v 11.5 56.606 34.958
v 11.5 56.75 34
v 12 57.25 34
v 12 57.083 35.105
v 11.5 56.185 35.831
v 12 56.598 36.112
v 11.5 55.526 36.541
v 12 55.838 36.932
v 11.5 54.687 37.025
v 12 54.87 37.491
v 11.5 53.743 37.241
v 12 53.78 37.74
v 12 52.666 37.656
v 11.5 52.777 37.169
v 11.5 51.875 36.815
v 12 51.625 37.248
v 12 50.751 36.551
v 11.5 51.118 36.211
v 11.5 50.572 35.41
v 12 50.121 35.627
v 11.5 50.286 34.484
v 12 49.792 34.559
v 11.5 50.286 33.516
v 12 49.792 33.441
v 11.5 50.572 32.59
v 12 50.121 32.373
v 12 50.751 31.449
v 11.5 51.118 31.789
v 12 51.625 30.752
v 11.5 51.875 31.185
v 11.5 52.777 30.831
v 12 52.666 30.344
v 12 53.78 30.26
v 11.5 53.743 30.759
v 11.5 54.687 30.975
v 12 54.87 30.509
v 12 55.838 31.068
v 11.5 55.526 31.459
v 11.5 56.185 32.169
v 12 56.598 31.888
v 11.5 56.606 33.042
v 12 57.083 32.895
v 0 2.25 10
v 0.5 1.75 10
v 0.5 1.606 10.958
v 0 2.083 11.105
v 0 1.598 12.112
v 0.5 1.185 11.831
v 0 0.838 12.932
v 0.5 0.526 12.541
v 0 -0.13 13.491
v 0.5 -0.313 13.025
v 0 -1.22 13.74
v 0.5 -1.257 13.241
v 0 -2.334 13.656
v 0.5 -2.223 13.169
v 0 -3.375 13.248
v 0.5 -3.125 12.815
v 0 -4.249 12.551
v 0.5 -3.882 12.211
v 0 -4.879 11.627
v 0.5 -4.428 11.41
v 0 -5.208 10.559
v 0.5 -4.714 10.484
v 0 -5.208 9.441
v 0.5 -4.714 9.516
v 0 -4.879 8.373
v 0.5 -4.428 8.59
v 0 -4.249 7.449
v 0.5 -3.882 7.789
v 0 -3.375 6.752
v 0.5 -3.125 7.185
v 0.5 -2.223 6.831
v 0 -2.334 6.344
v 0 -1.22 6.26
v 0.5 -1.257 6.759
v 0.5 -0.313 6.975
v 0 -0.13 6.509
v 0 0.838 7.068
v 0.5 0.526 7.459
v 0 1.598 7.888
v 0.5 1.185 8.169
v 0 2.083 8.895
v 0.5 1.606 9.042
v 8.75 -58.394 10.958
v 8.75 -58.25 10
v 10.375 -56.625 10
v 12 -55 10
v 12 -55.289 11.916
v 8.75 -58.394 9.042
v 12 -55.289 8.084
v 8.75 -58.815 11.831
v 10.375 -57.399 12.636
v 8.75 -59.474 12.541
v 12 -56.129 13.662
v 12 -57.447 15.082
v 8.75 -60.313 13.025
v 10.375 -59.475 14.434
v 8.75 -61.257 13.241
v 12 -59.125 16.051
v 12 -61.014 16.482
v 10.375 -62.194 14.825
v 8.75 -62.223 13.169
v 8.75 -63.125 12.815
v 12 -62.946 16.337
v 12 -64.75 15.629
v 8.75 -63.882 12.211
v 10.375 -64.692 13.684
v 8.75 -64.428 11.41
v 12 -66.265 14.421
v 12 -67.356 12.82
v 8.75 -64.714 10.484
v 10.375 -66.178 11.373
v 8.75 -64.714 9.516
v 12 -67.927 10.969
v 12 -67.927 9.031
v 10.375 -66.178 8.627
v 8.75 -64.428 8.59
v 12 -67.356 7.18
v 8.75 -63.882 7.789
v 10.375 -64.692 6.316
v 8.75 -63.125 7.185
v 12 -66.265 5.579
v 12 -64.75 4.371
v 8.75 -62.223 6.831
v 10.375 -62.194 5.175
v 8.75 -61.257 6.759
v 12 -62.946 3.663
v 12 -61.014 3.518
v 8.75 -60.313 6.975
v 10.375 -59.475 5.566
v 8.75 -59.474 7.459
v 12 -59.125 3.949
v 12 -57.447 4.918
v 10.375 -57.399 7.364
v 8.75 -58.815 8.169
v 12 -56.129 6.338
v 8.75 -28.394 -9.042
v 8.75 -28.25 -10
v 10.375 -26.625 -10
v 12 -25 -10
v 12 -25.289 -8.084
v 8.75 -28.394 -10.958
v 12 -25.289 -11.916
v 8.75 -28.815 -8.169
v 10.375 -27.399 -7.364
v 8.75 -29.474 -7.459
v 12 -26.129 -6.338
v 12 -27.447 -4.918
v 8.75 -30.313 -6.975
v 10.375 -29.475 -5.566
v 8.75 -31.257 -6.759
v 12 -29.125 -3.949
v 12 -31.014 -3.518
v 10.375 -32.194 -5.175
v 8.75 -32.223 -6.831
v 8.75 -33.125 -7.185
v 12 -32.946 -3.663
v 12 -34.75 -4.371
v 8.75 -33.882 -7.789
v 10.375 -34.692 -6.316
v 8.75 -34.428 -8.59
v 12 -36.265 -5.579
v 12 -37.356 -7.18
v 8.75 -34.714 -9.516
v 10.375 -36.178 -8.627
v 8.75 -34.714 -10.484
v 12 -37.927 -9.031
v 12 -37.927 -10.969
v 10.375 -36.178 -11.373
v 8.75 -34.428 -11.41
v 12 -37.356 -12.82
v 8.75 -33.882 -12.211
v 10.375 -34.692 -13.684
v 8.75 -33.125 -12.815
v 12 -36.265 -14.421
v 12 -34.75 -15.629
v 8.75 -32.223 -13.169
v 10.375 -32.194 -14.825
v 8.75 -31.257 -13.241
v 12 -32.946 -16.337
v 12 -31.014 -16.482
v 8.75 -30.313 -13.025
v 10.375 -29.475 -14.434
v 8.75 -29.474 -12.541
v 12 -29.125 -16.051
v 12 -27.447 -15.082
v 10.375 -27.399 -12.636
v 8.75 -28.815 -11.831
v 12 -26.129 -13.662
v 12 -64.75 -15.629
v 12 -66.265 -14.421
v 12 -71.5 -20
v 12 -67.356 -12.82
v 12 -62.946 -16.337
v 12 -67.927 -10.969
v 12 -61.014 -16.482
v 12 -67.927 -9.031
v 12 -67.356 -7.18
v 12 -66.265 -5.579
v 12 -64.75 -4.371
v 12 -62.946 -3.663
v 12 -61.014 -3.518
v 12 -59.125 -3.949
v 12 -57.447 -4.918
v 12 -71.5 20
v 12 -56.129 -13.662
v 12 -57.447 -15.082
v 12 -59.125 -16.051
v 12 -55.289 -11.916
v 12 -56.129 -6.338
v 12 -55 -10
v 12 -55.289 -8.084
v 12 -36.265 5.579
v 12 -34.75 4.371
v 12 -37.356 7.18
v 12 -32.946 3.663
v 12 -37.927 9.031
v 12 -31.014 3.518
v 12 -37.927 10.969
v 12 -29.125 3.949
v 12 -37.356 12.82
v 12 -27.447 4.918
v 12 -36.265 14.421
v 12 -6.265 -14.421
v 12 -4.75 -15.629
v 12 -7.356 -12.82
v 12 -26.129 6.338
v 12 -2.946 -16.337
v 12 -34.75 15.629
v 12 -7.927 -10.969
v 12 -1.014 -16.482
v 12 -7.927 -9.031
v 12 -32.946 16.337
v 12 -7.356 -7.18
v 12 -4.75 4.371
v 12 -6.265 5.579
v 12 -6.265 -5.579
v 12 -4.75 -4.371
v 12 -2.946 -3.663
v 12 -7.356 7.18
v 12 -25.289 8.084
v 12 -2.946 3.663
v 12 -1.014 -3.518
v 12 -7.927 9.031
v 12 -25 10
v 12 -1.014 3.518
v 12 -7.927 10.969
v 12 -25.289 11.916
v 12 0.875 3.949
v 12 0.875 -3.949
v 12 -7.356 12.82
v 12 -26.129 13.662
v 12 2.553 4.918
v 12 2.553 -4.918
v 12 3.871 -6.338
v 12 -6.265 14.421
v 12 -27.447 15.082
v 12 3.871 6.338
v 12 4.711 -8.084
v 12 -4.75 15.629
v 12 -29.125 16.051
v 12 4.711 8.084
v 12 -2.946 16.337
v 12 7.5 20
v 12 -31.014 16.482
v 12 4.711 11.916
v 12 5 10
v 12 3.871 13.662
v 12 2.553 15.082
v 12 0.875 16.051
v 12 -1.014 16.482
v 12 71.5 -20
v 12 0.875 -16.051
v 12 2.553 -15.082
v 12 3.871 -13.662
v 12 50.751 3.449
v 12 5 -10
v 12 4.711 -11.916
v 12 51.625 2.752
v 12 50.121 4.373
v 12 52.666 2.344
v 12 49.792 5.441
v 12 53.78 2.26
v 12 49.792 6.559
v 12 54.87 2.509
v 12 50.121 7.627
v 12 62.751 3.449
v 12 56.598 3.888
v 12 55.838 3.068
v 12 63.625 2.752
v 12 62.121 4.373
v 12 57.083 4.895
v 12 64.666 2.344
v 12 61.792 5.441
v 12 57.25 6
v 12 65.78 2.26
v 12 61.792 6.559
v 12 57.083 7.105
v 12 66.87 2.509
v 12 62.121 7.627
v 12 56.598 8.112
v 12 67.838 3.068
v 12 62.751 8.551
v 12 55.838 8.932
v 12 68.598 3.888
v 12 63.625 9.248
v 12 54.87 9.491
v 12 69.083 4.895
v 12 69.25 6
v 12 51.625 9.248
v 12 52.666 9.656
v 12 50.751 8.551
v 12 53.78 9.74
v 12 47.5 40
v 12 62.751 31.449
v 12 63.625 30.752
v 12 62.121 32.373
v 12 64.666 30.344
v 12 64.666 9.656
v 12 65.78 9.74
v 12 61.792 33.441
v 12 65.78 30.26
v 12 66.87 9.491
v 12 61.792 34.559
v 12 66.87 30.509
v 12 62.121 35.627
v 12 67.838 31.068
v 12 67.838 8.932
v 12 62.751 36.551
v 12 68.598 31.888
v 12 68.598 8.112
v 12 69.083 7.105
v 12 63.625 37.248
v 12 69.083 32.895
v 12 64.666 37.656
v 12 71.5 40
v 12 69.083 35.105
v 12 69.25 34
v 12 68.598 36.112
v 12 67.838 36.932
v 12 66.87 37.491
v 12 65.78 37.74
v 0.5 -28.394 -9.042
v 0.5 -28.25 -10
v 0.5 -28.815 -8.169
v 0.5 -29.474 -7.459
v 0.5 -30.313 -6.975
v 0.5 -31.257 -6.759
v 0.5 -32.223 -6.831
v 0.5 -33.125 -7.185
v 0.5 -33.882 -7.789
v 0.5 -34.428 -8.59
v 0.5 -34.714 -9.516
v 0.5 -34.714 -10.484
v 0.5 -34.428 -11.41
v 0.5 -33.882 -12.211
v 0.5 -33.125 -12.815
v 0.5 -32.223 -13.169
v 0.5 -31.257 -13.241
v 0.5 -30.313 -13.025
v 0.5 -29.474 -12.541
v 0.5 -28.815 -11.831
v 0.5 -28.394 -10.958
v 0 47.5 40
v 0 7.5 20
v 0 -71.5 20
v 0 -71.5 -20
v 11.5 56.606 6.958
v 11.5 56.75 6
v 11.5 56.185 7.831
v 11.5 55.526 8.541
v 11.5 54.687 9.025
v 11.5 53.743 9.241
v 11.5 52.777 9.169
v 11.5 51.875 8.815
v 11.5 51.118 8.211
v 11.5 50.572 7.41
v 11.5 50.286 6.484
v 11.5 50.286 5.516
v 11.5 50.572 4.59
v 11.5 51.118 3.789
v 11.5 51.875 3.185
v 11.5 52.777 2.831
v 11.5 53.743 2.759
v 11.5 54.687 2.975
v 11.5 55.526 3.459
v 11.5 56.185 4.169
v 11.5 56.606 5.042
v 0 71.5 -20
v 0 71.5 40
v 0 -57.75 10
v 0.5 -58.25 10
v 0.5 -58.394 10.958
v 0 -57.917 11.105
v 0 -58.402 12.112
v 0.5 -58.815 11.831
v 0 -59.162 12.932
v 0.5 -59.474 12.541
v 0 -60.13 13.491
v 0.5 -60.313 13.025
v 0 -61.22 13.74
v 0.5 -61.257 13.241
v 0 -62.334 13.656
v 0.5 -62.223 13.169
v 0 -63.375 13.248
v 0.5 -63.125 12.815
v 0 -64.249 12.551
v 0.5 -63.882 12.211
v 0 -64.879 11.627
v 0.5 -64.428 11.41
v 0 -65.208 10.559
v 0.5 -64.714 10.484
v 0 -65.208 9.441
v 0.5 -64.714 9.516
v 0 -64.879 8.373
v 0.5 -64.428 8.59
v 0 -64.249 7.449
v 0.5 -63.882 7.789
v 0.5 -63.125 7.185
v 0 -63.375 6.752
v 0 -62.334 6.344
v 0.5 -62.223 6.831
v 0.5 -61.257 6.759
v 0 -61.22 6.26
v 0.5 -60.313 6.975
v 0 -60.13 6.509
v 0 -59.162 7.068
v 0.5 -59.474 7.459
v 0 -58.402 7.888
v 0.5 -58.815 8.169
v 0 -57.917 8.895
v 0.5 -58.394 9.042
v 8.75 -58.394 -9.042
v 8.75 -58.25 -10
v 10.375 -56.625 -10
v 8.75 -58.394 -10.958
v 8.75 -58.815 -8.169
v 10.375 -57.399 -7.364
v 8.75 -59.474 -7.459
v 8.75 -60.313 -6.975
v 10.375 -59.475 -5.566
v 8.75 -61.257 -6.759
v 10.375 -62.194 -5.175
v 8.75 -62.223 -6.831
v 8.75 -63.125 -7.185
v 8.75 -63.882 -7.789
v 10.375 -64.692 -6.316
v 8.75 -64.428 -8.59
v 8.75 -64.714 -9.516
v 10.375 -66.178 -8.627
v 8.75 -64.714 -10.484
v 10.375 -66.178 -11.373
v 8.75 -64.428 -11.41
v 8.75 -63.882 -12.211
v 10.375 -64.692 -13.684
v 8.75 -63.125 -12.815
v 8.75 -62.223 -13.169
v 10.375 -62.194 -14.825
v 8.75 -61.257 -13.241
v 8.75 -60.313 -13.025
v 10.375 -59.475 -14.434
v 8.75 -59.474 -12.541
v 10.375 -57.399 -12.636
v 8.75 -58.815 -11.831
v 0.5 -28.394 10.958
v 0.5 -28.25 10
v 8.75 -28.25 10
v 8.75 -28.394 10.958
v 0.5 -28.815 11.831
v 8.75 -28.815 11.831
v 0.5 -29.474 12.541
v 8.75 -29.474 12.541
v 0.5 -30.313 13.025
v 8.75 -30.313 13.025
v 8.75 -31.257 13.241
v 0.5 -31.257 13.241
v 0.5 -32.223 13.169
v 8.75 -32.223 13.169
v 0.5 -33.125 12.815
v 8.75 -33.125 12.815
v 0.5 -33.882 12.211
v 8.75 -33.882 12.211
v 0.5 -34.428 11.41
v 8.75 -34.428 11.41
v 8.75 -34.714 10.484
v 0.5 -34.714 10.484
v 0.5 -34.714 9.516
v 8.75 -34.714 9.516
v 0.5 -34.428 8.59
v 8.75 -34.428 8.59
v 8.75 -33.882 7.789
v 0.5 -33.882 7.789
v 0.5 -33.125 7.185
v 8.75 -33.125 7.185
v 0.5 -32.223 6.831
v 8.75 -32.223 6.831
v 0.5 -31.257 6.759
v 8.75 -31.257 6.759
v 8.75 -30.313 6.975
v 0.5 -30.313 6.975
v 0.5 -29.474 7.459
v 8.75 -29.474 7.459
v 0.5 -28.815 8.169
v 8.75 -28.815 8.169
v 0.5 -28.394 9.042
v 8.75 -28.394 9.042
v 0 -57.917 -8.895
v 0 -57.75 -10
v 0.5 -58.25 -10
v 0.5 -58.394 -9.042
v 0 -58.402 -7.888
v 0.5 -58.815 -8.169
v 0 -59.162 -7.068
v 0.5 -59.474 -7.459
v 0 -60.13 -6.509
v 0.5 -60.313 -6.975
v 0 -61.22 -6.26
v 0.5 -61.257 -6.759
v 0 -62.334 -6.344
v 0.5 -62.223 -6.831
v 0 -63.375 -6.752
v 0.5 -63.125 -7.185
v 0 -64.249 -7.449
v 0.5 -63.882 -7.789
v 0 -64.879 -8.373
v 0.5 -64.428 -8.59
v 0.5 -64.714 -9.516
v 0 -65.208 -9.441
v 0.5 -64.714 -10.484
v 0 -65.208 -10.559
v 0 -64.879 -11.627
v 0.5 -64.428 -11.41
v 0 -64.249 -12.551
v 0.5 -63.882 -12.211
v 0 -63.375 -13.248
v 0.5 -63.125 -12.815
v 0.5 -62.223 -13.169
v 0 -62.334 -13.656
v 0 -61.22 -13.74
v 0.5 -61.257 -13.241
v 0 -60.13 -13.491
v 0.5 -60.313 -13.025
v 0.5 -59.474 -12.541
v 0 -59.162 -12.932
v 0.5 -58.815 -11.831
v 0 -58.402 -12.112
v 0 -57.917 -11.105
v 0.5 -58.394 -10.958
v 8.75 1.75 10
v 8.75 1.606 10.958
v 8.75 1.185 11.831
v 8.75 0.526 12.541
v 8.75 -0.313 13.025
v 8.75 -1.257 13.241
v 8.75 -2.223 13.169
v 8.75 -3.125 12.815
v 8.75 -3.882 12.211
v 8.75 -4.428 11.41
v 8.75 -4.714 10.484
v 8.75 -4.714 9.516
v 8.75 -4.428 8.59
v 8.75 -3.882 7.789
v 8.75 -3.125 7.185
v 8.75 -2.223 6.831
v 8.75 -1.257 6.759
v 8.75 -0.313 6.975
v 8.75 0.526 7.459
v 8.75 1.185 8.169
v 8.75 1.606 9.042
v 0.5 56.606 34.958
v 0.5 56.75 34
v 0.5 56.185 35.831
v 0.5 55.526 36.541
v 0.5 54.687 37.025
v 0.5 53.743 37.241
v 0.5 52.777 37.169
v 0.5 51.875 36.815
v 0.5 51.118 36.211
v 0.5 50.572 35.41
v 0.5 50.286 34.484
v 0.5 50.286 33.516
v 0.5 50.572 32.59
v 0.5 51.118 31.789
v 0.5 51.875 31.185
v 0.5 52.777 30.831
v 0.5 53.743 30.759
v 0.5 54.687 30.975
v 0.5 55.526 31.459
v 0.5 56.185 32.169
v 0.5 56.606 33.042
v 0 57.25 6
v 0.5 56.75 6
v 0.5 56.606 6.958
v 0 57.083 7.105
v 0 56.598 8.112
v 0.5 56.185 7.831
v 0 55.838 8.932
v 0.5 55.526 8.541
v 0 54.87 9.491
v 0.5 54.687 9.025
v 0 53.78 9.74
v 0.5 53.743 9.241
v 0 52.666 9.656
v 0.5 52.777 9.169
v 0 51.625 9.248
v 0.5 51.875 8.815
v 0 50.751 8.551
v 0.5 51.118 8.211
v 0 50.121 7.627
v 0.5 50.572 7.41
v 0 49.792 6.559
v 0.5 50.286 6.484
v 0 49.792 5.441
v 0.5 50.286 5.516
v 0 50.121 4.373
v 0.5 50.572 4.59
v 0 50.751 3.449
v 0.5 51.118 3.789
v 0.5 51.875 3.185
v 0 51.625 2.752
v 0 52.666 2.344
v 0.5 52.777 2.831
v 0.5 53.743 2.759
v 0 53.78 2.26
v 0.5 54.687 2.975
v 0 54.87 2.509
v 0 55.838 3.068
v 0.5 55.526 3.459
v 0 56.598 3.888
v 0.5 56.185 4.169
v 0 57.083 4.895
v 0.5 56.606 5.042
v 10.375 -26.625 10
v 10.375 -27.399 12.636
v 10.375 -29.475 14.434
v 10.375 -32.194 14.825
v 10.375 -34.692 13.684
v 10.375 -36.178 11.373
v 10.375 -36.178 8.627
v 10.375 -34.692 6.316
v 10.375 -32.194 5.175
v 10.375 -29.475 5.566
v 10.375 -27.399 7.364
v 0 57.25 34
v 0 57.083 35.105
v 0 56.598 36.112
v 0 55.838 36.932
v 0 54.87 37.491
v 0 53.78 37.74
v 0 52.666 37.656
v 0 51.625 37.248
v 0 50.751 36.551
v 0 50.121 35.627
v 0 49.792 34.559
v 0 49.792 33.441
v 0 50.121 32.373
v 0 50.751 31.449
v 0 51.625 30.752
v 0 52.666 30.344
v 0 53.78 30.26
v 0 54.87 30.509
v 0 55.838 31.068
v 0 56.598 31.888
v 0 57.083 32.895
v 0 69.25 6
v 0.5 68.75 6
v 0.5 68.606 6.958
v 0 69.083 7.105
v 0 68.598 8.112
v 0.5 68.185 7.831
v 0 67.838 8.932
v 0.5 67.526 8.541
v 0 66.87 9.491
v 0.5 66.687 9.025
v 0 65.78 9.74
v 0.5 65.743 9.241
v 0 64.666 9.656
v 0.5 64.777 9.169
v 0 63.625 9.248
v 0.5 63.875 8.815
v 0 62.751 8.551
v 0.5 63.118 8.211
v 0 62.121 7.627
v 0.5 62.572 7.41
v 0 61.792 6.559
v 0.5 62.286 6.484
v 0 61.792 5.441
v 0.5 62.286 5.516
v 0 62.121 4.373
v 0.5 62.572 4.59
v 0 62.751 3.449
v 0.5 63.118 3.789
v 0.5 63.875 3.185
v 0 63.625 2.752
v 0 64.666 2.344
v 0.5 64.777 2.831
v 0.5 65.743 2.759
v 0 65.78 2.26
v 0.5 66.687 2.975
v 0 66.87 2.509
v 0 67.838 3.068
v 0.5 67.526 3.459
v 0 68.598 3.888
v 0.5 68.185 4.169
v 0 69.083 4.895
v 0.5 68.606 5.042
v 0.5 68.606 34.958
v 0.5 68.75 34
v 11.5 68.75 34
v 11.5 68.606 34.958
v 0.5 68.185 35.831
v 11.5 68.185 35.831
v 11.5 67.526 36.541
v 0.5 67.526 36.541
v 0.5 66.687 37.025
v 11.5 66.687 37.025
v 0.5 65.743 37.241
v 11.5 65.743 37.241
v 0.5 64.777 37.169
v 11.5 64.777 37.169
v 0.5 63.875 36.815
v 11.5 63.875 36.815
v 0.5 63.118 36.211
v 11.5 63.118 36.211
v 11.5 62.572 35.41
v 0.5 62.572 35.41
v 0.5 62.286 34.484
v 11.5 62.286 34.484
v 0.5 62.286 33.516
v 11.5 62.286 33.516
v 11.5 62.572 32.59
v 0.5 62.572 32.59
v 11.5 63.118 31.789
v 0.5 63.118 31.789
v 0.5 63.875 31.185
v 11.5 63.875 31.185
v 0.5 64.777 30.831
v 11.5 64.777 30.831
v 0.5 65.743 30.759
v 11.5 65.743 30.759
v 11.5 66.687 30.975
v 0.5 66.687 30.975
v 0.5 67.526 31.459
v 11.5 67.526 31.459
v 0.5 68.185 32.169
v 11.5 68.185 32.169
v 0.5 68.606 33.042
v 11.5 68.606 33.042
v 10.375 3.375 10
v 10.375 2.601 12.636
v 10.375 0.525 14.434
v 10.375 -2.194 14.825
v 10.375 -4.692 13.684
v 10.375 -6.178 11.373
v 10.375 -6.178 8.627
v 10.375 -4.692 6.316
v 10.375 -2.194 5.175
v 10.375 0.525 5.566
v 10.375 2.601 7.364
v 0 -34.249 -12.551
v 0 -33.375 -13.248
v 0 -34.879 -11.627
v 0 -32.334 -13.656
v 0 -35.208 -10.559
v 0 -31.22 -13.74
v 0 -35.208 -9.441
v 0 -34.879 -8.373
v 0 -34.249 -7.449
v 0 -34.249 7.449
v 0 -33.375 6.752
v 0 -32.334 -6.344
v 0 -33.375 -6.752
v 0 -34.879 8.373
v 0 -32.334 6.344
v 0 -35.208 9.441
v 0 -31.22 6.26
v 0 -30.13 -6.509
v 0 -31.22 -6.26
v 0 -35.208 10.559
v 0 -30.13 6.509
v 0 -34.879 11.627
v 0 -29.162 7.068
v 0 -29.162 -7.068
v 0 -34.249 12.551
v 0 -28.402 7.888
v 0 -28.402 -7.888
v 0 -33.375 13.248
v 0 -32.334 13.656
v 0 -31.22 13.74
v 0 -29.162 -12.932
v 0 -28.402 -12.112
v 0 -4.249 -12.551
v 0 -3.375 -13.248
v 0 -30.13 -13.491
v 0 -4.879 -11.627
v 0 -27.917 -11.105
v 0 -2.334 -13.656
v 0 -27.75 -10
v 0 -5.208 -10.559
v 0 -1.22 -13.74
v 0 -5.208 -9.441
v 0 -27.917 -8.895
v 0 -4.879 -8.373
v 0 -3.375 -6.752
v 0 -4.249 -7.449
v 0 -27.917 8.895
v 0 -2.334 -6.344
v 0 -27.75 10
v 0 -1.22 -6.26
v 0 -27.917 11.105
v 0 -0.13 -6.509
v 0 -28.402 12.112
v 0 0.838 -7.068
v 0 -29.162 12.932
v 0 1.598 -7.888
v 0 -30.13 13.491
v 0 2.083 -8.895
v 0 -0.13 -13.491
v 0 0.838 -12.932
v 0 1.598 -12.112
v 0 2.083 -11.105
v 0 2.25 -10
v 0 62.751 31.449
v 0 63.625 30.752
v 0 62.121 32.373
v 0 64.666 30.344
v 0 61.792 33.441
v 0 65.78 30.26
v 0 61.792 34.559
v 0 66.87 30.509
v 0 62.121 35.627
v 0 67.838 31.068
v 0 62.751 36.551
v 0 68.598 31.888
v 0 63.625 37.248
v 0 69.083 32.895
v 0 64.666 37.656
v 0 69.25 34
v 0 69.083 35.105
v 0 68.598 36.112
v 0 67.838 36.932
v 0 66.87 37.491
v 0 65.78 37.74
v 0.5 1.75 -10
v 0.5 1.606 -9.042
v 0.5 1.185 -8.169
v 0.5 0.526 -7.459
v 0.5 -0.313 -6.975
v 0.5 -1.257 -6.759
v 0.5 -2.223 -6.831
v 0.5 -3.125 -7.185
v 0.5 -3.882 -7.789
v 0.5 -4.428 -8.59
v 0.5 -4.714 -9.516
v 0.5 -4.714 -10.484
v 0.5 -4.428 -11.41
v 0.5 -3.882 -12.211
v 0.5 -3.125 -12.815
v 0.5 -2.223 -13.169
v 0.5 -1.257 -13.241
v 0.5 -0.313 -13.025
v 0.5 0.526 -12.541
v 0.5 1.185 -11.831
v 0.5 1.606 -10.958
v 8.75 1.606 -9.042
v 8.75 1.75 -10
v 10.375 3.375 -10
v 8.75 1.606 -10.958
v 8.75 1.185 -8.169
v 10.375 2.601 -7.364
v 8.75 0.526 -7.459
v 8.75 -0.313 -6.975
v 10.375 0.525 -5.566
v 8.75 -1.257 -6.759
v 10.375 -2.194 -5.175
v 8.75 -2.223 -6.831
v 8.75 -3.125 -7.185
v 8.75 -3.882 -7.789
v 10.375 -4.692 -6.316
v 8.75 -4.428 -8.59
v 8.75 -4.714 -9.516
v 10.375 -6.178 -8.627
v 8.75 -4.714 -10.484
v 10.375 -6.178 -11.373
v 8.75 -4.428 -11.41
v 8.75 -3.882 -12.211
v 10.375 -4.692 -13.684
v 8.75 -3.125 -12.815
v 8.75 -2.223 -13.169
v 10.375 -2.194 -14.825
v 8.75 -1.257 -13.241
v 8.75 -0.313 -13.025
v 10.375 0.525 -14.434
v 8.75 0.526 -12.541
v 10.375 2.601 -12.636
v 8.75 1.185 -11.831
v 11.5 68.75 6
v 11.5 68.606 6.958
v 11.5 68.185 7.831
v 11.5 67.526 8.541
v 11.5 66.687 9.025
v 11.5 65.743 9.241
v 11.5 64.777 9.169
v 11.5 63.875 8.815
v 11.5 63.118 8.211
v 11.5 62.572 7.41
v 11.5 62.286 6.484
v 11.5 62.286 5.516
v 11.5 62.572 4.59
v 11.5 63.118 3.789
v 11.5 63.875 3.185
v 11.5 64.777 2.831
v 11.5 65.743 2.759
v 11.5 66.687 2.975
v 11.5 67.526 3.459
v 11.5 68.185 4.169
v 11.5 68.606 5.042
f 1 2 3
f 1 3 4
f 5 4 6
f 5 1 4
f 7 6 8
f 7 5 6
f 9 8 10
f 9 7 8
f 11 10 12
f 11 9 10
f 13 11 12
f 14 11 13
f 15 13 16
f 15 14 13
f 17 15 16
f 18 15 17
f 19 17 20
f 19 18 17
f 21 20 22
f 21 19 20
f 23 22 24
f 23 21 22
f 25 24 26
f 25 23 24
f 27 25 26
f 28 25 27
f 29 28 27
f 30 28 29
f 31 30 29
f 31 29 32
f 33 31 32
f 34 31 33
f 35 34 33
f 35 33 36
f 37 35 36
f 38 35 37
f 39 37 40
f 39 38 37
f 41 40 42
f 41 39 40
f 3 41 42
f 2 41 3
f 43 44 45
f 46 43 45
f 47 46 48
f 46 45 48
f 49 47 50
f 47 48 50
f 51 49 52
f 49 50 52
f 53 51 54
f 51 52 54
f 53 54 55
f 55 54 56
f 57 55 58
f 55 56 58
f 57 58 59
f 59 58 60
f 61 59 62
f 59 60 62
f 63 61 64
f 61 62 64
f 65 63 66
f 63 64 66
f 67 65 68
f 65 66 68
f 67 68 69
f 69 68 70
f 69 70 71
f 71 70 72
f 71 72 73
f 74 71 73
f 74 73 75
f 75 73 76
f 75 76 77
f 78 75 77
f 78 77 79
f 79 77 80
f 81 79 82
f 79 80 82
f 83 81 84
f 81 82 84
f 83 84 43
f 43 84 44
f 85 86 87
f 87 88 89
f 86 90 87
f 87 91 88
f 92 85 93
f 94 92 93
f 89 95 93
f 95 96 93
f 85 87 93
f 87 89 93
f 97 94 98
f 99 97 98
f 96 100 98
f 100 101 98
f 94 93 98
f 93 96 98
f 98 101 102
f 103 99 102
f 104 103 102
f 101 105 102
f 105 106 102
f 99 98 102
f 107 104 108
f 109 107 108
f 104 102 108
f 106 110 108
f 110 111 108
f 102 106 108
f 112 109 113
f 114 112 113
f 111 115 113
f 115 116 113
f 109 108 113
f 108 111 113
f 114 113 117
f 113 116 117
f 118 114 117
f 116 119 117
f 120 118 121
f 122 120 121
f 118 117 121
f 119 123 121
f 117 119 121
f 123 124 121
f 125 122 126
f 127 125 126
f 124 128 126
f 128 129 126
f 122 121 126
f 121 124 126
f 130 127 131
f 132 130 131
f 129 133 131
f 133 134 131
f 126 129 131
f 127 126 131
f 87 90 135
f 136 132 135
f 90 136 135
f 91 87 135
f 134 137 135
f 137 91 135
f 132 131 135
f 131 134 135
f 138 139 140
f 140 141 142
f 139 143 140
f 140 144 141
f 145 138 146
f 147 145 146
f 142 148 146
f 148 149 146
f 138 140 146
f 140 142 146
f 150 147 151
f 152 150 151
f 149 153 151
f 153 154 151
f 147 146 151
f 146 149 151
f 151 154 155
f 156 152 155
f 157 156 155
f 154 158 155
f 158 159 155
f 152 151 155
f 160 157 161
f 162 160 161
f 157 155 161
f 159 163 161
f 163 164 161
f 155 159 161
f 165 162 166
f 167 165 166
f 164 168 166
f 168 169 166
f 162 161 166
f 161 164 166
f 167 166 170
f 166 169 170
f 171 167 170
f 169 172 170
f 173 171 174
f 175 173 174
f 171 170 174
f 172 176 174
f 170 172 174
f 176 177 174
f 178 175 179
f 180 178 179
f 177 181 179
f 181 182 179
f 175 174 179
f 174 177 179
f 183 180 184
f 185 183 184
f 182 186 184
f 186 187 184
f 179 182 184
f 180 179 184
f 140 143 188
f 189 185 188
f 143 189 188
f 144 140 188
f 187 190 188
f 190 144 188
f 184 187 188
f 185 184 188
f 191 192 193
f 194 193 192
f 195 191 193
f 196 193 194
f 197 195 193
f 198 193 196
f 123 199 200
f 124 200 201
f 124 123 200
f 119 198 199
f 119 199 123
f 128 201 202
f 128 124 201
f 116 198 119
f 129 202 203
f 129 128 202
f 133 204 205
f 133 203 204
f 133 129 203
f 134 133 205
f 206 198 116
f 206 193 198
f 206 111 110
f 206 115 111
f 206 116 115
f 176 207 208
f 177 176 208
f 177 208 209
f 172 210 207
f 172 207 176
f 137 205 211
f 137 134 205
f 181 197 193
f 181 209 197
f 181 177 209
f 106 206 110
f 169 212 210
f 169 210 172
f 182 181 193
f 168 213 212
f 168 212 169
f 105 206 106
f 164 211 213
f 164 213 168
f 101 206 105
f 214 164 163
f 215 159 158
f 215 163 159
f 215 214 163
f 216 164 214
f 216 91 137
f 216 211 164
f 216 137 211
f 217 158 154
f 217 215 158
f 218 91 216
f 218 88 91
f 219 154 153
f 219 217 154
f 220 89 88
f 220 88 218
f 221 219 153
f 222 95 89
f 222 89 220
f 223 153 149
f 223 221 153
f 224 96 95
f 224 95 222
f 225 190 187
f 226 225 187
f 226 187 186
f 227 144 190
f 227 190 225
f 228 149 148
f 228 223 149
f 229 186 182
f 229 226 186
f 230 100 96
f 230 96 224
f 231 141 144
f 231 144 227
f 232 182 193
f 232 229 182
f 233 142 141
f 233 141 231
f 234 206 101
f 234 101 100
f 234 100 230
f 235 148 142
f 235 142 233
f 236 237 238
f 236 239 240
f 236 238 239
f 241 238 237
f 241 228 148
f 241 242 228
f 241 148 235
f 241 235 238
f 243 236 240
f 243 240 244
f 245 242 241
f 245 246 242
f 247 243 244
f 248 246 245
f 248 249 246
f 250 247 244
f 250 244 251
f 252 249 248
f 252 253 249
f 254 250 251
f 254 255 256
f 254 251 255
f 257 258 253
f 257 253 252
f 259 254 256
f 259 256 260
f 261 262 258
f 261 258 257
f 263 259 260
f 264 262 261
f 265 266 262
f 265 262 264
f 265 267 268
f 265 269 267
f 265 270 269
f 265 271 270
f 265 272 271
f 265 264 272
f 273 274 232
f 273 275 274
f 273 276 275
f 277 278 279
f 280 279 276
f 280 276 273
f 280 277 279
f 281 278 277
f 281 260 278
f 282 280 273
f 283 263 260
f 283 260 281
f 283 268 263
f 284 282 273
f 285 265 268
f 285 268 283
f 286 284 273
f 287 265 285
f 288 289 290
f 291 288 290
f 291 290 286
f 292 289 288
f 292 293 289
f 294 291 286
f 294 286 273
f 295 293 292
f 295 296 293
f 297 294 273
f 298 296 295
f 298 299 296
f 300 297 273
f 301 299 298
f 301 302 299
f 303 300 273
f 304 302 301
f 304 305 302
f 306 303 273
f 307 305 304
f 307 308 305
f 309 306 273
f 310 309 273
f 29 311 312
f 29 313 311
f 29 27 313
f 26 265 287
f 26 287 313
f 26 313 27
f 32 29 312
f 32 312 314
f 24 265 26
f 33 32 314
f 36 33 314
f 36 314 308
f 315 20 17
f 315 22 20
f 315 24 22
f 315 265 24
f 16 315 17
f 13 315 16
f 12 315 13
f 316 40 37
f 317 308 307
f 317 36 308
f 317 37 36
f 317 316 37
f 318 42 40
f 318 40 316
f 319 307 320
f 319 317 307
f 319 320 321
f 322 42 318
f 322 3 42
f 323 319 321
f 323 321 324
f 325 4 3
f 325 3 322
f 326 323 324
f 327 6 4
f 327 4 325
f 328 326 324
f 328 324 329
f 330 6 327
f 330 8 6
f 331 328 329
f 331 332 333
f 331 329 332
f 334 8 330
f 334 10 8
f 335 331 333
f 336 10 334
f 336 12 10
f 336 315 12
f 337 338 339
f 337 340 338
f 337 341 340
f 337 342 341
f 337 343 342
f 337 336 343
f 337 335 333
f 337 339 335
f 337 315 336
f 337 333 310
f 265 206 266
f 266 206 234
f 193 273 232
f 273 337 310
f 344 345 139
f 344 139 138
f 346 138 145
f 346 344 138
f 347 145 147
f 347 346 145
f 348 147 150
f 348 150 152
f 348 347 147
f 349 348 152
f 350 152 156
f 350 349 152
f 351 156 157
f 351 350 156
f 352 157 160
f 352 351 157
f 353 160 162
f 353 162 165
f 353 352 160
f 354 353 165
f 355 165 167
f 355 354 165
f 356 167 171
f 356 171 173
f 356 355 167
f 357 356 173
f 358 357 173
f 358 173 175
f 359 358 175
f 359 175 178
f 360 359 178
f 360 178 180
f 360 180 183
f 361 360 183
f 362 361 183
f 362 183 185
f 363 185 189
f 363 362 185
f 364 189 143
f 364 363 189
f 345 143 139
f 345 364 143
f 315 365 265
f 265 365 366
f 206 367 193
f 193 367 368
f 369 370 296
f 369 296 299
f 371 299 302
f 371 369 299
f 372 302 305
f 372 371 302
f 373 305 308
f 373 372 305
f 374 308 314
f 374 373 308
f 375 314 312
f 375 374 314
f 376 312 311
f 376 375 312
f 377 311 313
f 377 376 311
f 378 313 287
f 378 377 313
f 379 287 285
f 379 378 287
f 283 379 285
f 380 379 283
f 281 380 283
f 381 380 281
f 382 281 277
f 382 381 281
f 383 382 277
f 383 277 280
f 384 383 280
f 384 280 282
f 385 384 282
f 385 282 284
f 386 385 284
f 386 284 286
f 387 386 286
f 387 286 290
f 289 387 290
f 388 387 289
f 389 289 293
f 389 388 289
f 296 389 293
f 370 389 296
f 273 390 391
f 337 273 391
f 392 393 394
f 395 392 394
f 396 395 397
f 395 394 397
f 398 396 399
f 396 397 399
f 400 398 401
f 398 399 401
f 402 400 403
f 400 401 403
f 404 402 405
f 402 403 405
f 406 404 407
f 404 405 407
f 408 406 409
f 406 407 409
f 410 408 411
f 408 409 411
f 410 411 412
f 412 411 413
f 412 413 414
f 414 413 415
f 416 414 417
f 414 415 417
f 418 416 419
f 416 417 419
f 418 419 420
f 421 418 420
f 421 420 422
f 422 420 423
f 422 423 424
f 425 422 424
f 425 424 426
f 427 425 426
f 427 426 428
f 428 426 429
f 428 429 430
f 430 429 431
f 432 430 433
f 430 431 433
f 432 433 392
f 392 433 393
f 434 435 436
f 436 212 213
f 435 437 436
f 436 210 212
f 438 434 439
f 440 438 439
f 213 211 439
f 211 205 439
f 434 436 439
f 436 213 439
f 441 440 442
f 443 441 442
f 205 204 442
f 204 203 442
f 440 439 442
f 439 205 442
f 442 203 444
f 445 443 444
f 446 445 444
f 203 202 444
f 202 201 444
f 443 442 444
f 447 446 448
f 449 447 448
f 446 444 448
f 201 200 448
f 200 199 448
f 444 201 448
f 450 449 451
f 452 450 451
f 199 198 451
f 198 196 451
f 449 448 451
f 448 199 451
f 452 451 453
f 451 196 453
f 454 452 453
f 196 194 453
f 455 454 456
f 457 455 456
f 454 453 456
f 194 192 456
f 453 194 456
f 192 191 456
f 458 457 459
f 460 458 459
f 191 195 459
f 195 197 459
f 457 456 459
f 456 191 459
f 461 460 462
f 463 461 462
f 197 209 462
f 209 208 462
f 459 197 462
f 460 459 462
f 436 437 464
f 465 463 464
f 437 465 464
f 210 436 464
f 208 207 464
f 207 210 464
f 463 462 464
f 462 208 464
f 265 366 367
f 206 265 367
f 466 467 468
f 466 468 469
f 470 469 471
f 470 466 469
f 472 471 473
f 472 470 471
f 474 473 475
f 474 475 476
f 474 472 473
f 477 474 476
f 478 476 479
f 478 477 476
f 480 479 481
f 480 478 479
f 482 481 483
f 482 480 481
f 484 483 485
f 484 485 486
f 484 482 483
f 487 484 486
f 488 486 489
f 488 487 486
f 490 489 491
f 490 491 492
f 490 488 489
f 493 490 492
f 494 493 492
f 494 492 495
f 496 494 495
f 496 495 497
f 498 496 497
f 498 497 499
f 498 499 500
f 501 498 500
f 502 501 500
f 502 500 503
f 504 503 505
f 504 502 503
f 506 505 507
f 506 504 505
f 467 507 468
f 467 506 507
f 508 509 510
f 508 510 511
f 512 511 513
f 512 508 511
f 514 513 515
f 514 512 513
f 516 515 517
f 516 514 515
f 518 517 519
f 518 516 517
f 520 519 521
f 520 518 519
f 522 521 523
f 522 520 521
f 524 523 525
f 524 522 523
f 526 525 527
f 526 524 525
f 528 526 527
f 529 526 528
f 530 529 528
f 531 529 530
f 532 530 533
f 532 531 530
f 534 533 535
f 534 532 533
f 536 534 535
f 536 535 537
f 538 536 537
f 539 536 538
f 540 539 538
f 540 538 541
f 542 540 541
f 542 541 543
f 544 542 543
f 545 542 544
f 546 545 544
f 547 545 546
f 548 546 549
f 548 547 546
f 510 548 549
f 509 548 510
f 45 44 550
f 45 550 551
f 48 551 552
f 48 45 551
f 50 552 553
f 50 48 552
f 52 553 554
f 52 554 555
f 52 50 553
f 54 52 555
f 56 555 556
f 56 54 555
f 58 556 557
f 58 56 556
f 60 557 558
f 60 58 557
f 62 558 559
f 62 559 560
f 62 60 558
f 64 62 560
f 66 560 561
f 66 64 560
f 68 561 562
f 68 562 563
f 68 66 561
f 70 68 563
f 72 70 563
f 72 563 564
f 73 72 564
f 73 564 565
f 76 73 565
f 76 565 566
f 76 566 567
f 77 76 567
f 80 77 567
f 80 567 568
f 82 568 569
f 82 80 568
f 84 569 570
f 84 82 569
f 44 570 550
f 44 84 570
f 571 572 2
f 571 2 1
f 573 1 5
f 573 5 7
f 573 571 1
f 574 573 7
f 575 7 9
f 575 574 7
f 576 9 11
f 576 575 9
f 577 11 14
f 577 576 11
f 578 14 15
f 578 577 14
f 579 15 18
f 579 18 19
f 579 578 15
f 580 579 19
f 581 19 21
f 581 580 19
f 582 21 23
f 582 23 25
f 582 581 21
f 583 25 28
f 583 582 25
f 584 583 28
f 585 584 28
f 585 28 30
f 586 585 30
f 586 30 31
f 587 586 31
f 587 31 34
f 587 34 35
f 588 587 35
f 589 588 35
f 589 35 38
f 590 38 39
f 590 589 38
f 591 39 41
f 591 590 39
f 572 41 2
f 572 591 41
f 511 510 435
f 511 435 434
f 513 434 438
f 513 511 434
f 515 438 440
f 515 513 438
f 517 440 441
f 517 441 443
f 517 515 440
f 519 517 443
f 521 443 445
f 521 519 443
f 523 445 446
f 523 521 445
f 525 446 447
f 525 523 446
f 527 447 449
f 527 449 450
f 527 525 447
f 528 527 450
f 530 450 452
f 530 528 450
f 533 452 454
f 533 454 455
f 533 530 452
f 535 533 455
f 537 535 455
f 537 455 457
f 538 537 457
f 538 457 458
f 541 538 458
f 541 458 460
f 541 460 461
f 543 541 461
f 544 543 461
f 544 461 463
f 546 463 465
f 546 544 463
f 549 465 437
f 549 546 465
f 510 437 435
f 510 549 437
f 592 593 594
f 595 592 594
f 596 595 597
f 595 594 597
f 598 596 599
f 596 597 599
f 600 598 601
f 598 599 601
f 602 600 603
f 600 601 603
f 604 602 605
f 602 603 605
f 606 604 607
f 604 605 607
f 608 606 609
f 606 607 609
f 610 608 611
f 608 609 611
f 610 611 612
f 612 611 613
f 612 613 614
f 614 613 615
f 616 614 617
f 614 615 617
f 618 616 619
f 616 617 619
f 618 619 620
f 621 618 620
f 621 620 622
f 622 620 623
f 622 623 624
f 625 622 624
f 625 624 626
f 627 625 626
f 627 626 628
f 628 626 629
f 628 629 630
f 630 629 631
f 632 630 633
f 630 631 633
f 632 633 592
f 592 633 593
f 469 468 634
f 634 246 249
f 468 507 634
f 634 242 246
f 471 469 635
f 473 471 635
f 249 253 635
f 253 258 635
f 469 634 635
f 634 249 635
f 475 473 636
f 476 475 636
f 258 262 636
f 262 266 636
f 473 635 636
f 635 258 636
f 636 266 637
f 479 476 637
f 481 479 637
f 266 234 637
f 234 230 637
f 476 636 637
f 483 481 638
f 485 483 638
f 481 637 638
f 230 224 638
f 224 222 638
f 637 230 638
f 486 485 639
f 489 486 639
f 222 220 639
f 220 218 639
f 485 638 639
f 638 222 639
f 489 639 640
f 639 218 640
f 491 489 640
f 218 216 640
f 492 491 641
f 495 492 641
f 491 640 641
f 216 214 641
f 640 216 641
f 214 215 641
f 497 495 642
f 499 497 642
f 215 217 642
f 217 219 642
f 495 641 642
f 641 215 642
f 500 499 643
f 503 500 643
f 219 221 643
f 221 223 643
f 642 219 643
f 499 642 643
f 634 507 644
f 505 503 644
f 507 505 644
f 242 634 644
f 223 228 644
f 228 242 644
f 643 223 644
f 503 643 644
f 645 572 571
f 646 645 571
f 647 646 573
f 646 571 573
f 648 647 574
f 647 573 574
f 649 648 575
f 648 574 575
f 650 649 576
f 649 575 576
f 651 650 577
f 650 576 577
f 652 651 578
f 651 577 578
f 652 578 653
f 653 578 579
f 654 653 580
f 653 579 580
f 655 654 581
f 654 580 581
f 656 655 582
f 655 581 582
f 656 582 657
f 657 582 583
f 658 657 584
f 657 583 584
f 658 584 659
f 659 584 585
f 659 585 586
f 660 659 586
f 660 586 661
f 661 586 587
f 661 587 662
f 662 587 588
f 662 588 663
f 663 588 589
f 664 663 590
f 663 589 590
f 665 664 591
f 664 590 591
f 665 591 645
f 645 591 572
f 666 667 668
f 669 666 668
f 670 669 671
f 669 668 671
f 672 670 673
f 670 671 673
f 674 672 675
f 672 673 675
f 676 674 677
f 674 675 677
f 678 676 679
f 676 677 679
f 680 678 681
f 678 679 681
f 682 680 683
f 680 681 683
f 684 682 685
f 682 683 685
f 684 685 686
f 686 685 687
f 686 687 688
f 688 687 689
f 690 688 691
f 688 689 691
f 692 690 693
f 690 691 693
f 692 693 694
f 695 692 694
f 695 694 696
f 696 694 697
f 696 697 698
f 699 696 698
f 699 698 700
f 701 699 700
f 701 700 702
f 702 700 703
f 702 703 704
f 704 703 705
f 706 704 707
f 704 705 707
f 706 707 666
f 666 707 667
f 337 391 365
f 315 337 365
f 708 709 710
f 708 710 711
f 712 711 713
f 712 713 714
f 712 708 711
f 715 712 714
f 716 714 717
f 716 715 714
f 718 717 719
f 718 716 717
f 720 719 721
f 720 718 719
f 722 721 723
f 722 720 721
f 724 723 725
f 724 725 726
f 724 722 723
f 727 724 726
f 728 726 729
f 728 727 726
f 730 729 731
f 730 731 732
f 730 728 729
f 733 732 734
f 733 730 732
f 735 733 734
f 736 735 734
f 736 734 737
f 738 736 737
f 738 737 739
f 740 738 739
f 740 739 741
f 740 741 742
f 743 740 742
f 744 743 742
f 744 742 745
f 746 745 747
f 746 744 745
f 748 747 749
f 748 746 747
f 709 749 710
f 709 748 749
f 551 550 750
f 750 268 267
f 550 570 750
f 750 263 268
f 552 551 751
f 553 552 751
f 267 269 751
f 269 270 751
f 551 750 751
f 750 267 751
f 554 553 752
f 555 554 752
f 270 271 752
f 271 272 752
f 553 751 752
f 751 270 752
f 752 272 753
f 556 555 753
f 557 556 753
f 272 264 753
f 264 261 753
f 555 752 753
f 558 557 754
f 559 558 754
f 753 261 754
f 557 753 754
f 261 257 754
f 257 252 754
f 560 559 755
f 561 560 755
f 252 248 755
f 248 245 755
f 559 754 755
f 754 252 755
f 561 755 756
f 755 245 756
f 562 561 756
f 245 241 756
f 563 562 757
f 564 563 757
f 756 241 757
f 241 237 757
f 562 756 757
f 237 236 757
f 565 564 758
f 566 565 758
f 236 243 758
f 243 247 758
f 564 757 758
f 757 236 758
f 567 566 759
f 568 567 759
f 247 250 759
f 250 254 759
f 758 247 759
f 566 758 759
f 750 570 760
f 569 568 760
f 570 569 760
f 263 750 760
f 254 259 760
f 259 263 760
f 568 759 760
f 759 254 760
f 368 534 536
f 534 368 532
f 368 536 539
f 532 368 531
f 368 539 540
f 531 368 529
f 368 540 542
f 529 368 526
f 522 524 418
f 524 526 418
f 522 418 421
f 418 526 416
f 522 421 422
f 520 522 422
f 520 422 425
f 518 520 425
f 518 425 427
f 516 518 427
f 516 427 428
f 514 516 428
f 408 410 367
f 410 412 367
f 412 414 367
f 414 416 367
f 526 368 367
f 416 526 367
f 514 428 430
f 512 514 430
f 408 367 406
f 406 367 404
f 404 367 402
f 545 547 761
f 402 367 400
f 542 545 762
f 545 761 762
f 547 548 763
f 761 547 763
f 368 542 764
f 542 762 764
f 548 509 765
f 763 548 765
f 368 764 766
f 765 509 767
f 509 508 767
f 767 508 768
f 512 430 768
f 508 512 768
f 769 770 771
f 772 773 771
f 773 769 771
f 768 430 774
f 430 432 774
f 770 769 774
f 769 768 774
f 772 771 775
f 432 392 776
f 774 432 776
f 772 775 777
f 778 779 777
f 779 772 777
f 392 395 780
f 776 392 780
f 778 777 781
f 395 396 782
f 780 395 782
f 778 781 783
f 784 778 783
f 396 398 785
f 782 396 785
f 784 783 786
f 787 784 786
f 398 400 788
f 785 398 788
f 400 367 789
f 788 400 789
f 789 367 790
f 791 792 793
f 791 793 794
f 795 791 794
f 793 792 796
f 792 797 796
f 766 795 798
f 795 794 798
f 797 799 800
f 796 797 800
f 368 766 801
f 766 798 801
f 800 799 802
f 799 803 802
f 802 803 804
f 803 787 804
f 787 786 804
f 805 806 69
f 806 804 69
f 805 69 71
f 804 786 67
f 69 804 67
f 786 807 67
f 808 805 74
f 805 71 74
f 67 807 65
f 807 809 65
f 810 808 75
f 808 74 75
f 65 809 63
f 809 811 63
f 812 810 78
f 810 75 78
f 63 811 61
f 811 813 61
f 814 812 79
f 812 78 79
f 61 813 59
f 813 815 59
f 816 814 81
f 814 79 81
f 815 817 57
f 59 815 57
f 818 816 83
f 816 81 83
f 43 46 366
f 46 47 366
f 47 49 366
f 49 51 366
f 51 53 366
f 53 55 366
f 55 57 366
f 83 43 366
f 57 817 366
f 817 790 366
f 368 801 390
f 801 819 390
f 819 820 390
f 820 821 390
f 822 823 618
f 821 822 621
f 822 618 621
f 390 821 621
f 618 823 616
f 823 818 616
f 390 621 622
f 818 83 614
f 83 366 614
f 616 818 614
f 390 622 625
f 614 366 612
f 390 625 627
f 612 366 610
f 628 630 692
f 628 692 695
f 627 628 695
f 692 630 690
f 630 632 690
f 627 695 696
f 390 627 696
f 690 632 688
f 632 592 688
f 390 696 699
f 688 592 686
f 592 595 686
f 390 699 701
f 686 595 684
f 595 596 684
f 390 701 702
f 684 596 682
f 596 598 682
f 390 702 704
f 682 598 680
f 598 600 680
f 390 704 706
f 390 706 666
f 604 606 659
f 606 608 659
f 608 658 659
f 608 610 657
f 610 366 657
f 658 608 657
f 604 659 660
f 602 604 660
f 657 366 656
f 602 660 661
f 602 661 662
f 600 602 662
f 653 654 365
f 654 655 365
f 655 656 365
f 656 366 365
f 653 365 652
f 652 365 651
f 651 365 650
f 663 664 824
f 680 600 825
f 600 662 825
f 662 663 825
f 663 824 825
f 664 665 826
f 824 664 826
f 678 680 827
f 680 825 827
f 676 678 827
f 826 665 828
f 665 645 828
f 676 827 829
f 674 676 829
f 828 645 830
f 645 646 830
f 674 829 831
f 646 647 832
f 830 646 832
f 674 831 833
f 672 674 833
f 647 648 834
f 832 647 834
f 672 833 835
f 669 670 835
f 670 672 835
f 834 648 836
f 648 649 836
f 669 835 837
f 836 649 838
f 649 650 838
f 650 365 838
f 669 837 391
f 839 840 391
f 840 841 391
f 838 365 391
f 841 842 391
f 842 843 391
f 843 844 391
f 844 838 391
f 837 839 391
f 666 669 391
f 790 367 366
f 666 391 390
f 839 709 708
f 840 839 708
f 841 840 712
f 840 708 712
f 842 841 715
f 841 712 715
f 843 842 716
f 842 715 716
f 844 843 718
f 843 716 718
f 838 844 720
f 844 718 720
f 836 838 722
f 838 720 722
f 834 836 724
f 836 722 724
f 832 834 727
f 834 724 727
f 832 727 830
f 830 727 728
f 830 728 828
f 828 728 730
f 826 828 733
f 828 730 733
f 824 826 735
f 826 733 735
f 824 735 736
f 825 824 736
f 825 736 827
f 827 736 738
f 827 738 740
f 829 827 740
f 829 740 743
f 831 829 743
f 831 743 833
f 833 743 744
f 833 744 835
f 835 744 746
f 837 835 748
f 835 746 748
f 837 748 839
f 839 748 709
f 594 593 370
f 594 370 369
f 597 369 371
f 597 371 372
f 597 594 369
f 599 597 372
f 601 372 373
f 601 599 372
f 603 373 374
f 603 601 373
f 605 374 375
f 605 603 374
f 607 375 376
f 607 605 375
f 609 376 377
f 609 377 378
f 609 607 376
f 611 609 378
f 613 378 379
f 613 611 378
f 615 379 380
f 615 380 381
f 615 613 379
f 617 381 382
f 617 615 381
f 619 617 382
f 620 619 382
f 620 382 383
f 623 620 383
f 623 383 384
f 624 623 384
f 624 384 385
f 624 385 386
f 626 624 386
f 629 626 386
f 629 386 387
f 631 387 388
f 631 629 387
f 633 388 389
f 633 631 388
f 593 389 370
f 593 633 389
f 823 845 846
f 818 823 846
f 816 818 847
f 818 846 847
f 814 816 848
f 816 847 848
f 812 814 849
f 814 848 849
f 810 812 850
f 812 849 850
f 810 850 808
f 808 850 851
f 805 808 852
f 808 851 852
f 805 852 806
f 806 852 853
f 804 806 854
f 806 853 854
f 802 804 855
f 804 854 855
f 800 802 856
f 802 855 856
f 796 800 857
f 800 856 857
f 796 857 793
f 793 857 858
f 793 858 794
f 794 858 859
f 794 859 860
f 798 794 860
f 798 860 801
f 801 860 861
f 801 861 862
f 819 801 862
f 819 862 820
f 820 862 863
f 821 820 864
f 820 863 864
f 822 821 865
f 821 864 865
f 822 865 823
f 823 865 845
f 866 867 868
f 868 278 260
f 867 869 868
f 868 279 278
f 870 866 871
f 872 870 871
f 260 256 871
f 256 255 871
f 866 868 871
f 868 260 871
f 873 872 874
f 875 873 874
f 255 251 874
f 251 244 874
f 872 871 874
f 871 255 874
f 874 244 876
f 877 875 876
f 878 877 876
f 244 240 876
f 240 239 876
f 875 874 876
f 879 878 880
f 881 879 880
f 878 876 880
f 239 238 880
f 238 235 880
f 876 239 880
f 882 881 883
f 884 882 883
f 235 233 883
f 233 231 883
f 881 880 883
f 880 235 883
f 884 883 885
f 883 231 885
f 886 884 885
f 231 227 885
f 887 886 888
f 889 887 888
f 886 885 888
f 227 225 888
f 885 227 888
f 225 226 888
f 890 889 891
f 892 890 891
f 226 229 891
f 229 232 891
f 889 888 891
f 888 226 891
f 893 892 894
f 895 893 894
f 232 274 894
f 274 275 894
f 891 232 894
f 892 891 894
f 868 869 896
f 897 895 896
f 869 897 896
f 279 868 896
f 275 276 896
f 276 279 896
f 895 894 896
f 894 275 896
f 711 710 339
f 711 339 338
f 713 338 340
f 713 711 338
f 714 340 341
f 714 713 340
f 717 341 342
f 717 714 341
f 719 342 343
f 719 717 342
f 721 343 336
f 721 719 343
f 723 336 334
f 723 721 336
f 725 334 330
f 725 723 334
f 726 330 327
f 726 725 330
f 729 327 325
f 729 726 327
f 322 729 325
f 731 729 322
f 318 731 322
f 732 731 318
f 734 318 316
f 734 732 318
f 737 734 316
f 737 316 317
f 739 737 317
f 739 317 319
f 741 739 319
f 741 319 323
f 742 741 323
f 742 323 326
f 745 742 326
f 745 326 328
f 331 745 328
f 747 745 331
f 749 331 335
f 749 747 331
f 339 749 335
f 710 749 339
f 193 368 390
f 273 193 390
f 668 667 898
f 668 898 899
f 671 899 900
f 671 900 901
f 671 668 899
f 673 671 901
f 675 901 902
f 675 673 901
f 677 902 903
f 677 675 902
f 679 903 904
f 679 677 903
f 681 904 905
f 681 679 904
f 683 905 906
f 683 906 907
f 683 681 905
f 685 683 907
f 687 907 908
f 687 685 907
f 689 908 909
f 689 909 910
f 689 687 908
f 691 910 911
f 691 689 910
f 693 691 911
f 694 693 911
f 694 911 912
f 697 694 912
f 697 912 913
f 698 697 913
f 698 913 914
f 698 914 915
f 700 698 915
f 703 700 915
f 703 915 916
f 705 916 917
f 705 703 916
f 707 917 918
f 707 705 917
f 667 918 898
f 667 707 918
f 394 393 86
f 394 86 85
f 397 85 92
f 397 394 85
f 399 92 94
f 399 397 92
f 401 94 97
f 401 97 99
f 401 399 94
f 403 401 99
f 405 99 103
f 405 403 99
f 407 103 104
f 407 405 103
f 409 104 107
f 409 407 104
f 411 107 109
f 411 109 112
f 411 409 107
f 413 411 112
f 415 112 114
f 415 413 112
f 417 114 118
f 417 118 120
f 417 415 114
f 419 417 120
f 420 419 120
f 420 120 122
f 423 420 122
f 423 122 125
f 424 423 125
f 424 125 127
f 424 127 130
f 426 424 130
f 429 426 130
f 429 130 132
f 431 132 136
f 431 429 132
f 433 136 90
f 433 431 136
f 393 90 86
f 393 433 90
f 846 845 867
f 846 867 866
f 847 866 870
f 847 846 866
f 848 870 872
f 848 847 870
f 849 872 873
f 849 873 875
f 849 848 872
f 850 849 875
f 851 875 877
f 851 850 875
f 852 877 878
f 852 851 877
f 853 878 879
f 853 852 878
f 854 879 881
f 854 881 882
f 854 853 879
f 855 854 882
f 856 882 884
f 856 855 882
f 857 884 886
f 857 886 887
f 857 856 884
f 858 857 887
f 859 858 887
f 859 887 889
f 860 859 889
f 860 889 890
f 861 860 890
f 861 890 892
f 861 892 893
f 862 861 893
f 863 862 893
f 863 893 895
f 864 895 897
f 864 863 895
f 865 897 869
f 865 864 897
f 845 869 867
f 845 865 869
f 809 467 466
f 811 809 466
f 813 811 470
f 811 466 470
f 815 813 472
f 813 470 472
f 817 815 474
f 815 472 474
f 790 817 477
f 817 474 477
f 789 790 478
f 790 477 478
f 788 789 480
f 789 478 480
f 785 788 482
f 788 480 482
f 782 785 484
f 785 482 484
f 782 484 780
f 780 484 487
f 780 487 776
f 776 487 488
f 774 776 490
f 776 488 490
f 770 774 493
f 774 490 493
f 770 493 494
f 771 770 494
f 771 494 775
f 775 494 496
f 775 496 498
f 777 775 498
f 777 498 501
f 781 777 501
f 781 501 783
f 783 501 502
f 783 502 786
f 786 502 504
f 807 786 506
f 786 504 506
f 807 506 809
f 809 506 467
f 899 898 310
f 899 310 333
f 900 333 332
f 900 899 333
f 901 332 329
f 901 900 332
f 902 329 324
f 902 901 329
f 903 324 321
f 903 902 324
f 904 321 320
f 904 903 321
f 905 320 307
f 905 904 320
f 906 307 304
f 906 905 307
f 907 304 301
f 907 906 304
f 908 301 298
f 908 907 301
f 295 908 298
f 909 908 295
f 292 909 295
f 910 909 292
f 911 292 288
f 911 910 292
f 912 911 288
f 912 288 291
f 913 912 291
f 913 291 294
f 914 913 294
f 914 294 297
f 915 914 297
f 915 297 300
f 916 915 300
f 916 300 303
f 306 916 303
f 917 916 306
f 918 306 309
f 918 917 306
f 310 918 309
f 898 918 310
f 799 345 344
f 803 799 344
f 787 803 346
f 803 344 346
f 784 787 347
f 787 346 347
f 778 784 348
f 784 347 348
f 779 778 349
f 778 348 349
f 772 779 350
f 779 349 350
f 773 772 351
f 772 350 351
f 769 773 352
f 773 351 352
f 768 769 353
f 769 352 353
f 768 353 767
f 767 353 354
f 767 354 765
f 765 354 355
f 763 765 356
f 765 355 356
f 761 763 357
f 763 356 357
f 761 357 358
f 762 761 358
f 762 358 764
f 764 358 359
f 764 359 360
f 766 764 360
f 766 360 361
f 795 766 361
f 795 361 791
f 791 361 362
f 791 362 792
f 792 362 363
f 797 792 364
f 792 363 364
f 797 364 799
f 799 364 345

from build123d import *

# Parameters (mm, degrees)
F0_R     = 3.25
F1_DEPTH = 12
F2_SIZE  = 3.25
F3_SIZE  = 0.5


with BuildPart() as f1:
    # F0 (on Right) → F1 (new body)
    with BuildSketch(Plane.YZ):
        Polygon((7.5, 20), (-71.5, 20), (-71.5, -20), (71.5, -20), (71.5, 20), (71.5, 40), (47.5, 40), align=None)
        with Locations((-61.5, -10)):
            Circle(F0_R, mode=Mode.SUBTRACT)
        with Locations((-31.5, -10)):
            Circle(F0_R, mode=Mode.SUBTRACT)
        with Locations((-1.5, -10)):
            Circle(F0_R, mode=Mode.SUBTRACT)
        with Locations((53.5, 5.999998)):
            Circle(F0_R, mode=Mode.SUBTRACT)
        with Locations((65.5, 5.999998)):
            Circle(F0_R, mode=Mode.SUBTRACT)
        with Locations((-61.5, 10)):
            Circle(F0_R, mode=Mode.SUBTRACT)
        with Locations((-31.5, 10)):
            Circle(F0_R, mode=Mode.SUBTRACT)
        with Locations((-1.5, 10)):
            Circle(F0_R, mode=Mode.SUBTRACT)
        with Locations((53.5, 33.999998)):
            Circle(F0_R, mode=Mode.SUBTRACT)
        with Locations((65.5, 33.999998)):
            Circle(F0_R, mode=Mode.SUBTRACT)
    extrude(amount=F1_DEPTH)

    # F2
    f2_edges = [f1.edges().sort_by_distance(p)[0] for p in [
        (12, -64.75, 10),
        (12, -34.75, 10),
        (12, -4.75, 10),
        (12, -4.75, -10),
        (12, -34.75, -10),
        (12, -64.75, -10),
    ]]
    chamfer(f2_edges, length=F2_SIZE)

    # F3
    f3_edges = [f1.edges().sort_by_distance(p)[0] for p in [
        (0, -4.75, -10),
        (0, -4.75, 10),
        (0, -34.75, 10),
        (0, -34.75, -10),
        (0, -64.75, -10),
        (0, -64.75, 10),
        (6, 68.75, 33.999998),
        (0, 62.25, 33.999998),
        (12, 62.25, 33.999998),
        (6, 56.75, 33.999998),
        (0, 50.25, 33.999998),
        (12, 50.25, 33.999998),
        (6, 56.75, 5.999998),
        (0, 50.25, 5.999998),
        (12, 50.25, 5.999998),
        (6, 68.75, 5.999998),
        (0, 62.25, 5.999998),
        (12, 62.25, 5.999998),
    ]]
    chamfer(f3_edges, length=F3_SIZE)


solid = f1.part
